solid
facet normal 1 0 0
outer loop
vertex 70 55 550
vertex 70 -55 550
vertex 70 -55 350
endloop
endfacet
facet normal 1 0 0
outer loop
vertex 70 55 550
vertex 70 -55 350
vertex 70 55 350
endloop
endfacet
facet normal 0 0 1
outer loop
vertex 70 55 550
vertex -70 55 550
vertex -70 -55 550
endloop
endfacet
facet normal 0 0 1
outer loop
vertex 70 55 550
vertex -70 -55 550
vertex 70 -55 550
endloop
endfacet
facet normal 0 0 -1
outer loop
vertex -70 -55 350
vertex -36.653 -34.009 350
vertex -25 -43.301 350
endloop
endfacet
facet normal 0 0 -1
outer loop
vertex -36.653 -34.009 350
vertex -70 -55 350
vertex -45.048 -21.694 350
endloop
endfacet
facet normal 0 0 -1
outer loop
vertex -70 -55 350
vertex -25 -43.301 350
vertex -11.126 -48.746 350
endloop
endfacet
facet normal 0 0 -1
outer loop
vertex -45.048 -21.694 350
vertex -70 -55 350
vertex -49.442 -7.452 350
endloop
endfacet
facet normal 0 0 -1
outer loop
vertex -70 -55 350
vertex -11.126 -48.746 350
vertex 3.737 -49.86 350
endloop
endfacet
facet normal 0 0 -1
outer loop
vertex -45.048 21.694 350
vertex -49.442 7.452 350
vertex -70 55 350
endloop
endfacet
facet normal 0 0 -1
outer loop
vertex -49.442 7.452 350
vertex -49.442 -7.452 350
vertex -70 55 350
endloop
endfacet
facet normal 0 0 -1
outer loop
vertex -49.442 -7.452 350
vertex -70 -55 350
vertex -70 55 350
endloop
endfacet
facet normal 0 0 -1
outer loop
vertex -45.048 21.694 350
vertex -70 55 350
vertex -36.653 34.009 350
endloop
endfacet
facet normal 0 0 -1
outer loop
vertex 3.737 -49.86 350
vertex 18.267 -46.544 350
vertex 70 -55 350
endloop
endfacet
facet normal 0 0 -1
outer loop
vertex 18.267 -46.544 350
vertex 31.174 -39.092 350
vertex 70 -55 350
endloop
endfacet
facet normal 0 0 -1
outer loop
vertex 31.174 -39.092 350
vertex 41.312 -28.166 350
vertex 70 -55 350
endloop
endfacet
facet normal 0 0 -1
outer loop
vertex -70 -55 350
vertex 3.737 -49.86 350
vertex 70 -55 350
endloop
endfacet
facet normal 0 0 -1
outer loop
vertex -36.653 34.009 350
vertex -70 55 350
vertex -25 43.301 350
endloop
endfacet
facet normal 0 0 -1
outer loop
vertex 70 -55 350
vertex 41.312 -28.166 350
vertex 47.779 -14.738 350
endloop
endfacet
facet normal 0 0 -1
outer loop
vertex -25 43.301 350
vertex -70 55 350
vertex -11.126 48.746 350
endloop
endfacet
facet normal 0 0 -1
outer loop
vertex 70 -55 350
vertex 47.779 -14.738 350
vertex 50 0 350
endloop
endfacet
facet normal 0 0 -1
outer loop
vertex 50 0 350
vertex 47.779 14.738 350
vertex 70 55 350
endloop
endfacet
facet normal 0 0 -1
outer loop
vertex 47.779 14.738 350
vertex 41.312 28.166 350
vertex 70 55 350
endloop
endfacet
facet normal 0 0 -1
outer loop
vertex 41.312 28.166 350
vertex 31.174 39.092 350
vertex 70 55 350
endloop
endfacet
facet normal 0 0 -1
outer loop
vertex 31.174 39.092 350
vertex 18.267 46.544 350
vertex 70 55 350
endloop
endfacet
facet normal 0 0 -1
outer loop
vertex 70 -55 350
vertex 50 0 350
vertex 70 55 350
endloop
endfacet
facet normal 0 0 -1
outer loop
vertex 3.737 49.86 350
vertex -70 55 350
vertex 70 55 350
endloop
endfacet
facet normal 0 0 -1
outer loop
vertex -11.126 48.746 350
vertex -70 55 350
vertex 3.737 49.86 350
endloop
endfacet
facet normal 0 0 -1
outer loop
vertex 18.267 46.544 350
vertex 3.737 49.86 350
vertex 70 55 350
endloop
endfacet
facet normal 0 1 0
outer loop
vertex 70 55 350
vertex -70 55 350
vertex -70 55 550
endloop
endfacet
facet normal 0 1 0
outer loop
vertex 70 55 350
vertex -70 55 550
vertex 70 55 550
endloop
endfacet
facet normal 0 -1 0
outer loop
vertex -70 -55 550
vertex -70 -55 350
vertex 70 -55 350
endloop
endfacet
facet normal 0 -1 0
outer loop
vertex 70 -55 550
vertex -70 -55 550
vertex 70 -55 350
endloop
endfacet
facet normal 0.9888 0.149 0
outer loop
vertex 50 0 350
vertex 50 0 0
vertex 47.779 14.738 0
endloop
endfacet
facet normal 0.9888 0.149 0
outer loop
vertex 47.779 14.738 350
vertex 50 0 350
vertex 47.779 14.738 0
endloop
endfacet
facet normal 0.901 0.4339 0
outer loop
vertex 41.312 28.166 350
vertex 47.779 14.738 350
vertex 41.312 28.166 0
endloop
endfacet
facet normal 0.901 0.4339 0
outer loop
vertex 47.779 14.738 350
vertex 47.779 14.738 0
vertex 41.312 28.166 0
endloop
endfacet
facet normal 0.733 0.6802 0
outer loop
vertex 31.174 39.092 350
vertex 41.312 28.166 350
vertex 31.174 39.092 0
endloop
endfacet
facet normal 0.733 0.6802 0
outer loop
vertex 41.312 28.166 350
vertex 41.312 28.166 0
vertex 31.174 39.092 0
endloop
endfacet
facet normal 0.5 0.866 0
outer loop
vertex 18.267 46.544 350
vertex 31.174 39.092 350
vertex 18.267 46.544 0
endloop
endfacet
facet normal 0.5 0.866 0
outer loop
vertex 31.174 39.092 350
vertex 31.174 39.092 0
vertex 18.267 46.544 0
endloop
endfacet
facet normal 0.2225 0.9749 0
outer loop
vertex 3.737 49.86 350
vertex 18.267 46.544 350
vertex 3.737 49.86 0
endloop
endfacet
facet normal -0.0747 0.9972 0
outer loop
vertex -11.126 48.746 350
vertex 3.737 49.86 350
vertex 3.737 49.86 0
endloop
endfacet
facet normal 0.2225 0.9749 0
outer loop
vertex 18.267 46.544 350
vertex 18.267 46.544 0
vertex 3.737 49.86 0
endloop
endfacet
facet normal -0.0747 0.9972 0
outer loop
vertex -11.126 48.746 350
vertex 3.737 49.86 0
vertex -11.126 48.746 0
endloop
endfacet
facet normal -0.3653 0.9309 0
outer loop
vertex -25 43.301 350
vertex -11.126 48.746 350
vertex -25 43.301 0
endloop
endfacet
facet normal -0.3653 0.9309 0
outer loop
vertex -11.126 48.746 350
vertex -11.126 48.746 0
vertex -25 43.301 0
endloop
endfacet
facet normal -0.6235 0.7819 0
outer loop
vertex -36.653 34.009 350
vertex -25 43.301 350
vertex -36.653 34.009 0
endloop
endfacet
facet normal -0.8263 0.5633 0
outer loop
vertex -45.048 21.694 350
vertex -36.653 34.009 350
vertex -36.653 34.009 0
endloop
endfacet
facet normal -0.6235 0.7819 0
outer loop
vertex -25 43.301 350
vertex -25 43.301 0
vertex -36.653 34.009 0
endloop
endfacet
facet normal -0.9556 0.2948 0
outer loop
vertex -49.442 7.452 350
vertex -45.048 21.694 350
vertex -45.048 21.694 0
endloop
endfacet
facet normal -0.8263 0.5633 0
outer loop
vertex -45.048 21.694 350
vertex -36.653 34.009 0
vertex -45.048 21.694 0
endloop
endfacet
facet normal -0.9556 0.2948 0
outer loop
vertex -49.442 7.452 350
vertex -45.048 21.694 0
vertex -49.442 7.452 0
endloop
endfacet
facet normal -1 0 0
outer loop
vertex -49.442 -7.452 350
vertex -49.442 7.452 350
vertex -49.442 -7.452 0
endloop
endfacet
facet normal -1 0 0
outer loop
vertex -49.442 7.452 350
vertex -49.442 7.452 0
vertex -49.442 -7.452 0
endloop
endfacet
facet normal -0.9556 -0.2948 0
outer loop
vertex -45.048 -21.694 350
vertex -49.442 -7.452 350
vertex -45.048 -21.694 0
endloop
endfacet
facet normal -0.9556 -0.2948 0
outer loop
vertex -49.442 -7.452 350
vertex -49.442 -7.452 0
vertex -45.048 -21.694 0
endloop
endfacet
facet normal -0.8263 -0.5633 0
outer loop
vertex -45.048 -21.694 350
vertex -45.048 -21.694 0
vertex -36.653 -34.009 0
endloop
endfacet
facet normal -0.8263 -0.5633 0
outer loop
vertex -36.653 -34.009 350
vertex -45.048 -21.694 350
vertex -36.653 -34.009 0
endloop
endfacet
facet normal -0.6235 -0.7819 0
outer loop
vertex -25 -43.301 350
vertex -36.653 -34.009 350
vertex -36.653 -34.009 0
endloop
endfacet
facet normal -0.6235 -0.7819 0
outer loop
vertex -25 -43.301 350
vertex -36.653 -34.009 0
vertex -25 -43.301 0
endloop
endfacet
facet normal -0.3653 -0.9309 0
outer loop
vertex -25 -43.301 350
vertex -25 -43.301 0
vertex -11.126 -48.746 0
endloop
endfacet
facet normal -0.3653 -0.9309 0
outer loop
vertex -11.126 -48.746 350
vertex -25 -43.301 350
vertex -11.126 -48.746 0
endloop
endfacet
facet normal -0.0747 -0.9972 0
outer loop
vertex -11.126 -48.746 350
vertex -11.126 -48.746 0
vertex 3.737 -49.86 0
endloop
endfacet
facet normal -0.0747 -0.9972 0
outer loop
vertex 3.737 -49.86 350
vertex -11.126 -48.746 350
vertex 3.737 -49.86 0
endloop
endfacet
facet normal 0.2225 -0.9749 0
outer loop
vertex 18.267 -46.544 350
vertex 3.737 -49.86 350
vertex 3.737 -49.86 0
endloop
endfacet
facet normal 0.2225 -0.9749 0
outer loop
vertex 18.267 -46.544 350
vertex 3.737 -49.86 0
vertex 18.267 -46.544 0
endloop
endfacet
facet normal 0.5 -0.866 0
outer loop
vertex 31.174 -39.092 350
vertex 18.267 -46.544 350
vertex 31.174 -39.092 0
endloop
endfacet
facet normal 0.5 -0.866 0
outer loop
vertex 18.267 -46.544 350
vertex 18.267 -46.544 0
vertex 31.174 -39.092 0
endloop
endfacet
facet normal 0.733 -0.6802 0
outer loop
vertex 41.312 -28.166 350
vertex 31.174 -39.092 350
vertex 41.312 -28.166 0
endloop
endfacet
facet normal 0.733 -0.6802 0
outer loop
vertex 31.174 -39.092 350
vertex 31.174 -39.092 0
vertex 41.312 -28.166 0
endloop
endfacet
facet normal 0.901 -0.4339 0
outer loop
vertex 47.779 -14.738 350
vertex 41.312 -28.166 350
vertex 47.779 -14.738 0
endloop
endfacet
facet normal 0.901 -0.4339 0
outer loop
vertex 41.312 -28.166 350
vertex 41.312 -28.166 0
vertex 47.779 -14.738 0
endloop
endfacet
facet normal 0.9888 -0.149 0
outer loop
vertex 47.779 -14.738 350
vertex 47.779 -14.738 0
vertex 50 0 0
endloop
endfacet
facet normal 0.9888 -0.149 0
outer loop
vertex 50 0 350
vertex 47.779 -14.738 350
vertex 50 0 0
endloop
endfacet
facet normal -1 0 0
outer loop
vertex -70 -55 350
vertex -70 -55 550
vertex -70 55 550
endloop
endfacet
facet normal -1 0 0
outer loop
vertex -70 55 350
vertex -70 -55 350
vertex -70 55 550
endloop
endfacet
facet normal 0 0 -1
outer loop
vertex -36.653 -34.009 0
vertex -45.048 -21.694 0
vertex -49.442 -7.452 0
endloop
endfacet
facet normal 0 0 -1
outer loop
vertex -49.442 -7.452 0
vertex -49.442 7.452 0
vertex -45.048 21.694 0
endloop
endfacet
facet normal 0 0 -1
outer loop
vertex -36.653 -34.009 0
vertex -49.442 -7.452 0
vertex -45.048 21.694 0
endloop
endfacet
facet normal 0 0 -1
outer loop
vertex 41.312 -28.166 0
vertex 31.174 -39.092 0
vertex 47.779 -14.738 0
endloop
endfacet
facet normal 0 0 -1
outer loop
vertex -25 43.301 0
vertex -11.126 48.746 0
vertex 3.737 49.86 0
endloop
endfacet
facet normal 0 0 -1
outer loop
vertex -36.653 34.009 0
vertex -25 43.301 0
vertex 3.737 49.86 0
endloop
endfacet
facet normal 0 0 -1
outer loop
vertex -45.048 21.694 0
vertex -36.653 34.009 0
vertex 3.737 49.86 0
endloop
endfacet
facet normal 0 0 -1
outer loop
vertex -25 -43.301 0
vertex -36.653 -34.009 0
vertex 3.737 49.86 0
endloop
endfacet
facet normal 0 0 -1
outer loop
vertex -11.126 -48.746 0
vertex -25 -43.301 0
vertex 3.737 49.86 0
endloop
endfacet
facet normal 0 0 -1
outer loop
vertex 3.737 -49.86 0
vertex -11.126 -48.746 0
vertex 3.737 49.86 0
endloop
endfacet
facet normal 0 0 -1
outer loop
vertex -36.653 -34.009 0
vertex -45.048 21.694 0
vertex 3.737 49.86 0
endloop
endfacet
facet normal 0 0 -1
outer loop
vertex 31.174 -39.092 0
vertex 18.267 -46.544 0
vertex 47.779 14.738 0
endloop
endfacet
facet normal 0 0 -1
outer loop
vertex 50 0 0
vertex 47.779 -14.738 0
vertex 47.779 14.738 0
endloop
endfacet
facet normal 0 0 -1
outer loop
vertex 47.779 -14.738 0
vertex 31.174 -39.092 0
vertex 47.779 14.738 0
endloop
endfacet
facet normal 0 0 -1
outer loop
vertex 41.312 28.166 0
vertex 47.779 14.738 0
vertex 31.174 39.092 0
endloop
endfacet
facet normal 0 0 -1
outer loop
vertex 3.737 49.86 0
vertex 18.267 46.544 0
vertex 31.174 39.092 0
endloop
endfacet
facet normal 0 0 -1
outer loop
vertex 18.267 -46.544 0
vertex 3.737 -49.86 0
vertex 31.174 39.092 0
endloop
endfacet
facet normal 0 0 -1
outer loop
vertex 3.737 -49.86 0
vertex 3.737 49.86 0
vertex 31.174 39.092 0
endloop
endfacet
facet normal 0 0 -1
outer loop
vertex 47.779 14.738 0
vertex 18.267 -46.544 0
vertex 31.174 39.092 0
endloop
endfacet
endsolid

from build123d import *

# Parameters (mm, degrees)
F0_R     = 50
F1_DEPTH = 350
F2_W     = 140
F2_H     = 110
F2_R     = 50
F3_DEPTH = 200


# Not quite as in the source:
# - a feature names something its author has since deleted; it is built from what else it names


with BuildPart() as f1:
    # F0 (on Top) → F1 (new body)
    with BuildSketch(Plane.XY):
        Circle(F0_R)
    extrude(amount=F1_DEPTH)

    # F2 (on face) → F3 (join)
    with BuildSketch(Plane.XY.offset(350)):
        Rectangle(F2_W, F2_H)
        Circle(F2_R, mode=Mode.SUBTRACT)
        Circle(F2_R)
    extrude(amount=F3_DEPTH)


solid = f1.part
